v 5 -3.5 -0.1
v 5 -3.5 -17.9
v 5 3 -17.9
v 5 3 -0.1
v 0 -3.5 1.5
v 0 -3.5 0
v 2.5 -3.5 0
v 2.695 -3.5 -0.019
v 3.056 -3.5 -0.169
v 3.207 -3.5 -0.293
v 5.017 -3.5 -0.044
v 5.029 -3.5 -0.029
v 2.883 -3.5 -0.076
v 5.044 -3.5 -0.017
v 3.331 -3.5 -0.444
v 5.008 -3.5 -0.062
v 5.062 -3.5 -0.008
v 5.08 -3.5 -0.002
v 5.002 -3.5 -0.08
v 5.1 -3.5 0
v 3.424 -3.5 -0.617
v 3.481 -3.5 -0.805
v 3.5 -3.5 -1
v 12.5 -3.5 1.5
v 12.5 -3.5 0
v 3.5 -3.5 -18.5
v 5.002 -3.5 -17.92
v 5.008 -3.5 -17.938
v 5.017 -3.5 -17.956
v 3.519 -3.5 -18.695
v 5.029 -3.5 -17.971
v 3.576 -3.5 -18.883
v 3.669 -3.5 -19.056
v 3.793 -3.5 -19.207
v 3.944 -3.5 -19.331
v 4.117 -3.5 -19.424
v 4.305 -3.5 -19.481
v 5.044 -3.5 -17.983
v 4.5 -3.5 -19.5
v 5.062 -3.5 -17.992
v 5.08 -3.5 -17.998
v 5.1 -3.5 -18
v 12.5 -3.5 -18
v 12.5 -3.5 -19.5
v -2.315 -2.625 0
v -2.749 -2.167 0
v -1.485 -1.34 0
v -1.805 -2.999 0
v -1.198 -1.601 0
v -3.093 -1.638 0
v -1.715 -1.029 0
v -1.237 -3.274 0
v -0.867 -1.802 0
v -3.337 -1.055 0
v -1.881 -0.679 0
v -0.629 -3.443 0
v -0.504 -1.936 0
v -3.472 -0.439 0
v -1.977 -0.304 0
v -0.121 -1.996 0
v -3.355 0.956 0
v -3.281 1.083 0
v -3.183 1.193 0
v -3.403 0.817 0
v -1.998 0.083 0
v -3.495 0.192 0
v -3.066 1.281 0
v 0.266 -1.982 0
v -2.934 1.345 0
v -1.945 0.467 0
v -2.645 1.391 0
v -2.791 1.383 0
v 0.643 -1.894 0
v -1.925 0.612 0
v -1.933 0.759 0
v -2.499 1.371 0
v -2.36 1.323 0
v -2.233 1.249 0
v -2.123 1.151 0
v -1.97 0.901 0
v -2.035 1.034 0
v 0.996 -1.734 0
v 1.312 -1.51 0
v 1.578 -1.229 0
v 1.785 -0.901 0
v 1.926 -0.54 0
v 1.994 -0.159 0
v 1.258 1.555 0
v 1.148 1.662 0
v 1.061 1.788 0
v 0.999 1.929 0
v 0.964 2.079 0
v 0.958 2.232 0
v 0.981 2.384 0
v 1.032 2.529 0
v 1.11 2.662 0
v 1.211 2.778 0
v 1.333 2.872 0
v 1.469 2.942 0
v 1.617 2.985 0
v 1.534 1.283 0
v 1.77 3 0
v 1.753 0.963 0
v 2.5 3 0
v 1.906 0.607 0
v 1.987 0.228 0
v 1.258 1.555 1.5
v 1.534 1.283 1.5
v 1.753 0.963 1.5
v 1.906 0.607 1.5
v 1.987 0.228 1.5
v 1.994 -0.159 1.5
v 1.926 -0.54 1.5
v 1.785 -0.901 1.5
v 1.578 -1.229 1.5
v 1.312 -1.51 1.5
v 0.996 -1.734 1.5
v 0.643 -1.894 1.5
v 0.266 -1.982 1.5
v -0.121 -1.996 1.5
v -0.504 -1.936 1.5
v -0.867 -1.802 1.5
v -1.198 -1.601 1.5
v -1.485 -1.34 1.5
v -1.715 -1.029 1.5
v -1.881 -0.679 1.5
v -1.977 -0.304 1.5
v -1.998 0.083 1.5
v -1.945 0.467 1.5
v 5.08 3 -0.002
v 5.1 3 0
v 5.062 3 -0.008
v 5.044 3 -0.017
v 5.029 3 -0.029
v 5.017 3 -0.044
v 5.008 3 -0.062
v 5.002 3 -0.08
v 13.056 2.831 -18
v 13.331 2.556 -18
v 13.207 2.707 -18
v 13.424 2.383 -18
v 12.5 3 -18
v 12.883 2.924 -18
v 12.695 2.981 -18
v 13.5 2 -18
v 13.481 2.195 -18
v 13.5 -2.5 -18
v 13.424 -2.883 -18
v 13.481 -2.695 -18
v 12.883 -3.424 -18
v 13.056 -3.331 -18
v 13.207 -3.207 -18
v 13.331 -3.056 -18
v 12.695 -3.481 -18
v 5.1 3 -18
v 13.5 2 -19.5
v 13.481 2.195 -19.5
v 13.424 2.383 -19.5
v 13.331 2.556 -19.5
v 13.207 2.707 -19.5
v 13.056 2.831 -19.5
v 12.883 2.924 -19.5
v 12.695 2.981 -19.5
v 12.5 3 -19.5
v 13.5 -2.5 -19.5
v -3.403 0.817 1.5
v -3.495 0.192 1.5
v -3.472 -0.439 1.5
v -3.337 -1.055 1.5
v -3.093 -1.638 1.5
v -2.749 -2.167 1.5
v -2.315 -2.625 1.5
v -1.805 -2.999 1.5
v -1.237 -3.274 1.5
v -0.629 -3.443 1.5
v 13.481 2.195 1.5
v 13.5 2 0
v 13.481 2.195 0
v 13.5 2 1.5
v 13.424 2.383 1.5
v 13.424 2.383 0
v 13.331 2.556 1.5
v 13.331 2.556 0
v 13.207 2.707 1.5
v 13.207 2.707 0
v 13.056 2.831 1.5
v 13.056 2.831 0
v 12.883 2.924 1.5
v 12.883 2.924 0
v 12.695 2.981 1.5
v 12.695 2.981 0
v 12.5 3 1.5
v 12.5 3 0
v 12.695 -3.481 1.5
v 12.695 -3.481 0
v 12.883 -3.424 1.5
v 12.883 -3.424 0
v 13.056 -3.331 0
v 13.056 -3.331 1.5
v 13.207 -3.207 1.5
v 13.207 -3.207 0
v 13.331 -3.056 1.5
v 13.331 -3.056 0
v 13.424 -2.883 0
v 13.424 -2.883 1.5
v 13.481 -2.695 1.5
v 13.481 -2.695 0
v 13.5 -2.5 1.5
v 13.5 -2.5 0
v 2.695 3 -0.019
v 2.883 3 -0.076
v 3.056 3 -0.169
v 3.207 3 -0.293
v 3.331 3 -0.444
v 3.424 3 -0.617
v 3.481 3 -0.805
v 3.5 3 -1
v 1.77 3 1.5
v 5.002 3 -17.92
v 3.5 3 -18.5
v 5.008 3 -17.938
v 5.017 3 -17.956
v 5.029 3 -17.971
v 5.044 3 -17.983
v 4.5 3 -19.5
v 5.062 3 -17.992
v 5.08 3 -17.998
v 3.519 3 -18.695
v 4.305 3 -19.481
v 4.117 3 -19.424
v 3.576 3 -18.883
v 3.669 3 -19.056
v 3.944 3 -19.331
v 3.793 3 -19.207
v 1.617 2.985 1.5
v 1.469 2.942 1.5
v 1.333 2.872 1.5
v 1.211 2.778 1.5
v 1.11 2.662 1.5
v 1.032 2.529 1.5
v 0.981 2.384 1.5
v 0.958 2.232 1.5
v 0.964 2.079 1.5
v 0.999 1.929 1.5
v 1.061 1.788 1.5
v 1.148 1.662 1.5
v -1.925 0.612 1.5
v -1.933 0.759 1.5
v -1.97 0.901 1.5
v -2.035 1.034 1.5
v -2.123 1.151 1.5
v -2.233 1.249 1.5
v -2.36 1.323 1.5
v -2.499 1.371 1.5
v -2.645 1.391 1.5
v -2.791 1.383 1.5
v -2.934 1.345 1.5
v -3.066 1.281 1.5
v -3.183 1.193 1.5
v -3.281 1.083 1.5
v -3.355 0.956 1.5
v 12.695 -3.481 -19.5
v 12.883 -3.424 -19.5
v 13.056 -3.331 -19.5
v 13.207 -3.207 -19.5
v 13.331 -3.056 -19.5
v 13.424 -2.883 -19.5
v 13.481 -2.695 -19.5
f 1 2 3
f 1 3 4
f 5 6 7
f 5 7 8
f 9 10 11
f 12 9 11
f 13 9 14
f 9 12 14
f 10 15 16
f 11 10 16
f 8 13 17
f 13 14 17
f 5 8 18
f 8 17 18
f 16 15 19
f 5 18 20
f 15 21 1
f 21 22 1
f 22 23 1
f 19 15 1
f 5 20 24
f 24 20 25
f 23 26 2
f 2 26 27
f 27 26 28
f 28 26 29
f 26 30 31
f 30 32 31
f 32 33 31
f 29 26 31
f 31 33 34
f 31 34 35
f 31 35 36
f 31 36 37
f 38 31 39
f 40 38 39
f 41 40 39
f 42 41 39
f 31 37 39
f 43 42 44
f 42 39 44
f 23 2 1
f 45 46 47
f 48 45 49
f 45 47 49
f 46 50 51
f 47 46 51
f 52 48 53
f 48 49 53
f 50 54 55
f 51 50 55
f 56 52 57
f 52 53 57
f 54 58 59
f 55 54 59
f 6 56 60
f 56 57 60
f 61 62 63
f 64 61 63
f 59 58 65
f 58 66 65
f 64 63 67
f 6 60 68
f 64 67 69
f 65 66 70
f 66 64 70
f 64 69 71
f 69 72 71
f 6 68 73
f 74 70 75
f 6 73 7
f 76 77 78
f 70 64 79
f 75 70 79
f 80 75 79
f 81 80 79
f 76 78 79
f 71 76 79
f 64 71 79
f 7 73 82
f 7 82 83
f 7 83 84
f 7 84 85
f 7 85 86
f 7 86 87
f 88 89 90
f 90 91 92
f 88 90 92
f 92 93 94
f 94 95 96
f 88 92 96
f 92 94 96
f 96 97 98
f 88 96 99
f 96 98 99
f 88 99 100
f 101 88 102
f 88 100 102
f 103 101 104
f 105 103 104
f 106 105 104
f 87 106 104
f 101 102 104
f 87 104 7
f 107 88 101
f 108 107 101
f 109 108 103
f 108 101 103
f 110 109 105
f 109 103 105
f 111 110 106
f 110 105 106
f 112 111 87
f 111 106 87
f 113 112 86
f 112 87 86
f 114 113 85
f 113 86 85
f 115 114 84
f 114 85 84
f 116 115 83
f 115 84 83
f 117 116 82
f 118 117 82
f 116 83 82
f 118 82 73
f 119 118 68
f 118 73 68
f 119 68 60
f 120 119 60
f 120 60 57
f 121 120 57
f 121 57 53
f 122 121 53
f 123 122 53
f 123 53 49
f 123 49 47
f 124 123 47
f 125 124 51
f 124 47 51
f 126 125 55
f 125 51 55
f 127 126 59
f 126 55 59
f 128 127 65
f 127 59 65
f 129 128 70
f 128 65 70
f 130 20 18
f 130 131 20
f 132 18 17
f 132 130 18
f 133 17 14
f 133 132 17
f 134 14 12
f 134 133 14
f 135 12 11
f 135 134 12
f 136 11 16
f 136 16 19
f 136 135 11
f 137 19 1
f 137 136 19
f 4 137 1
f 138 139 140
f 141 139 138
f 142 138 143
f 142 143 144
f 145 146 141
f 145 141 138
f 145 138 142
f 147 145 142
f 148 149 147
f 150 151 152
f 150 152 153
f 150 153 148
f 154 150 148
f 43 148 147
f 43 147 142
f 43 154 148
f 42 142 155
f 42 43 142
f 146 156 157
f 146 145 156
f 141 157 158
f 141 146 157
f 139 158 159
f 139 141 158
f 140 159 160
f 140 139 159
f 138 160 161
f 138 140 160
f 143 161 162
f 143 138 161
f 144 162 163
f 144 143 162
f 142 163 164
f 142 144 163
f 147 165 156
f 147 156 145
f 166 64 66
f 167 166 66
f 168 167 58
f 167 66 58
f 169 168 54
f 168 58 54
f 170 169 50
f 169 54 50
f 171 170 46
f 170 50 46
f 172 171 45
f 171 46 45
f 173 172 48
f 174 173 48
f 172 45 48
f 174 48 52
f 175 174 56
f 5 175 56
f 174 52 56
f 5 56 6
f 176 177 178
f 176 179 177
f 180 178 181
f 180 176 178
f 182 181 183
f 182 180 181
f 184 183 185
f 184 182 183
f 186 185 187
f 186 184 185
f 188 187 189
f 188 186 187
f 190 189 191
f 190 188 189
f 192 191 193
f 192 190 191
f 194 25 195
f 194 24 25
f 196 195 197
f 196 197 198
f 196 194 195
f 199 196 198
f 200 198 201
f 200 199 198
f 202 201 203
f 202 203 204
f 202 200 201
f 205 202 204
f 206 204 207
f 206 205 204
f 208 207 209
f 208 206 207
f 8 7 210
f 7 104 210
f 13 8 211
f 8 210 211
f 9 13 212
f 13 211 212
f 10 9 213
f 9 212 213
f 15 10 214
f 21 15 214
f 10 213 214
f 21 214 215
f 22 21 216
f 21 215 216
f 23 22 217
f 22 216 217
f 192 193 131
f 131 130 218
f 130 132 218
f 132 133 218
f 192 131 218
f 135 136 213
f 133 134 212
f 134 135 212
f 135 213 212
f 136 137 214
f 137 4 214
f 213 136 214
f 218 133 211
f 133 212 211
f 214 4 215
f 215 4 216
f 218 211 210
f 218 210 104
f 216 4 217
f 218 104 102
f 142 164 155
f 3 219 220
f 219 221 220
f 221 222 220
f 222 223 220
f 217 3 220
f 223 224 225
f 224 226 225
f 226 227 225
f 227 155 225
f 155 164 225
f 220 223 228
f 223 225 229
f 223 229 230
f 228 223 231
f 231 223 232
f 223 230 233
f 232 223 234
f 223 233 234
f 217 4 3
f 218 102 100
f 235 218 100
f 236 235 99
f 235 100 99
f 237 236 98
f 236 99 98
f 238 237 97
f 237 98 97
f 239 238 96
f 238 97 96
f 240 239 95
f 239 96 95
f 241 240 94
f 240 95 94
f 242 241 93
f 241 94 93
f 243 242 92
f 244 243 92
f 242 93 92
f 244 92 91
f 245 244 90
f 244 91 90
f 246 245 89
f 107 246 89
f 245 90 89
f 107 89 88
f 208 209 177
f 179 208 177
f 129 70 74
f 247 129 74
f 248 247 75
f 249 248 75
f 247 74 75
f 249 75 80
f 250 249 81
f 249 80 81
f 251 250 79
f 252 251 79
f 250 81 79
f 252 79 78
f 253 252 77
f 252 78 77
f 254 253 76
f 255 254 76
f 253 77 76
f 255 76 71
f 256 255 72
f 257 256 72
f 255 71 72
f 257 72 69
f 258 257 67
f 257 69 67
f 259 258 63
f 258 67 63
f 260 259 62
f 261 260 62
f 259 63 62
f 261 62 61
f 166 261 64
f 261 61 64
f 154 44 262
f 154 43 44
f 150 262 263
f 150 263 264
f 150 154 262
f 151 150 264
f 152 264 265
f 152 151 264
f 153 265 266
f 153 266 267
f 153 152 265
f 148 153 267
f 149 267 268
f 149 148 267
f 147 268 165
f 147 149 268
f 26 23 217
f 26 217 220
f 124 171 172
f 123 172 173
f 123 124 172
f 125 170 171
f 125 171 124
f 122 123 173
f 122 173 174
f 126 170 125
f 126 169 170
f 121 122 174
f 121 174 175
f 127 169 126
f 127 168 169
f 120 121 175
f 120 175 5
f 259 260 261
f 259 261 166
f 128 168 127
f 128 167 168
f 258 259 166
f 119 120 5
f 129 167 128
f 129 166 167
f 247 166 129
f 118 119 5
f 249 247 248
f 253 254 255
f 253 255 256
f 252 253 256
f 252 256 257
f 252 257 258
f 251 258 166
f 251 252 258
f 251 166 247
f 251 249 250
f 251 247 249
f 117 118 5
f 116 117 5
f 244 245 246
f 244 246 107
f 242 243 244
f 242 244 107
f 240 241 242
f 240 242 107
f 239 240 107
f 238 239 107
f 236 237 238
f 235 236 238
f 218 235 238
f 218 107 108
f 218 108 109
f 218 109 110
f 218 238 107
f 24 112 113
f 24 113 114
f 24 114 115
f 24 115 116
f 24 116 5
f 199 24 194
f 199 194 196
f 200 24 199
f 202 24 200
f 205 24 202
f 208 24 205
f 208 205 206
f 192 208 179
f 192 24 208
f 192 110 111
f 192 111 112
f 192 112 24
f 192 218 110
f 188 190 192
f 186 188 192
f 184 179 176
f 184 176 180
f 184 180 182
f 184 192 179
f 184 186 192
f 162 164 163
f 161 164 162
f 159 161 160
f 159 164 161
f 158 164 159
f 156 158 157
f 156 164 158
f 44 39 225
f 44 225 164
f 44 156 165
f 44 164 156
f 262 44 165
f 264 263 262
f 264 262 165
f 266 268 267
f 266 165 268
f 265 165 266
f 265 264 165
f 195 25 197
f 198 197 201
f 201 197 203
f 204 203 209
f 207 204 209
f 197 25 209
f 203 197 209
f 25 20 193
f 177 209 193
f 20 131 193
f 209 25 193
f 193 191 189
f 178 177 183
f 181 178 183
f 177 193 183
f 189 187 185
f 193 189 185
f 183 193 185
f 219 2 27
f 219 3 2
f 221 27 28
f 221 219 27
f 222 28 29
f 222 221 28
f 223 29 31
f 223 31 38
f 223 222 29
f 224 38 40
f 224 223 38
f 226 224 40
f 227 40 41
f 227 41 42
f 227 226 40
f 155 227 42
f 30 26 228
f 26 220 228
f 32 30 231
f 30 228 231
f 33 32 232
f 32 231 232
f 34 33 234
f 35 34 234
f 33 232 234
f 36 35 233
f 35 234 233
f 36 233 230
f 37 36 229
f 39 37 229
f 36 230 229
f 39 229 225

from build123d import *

# Parameters (mm, degrees)
F1_DEPTH = 1.5
F3_DEPTH = 6.5
F4_R     = 0.1
F5_R     = 1
F6_R     = 1


# Not quite as in the source:
# - a feature of the source that left no trace in its solid (it failed there, or was rolled back) is left out


with BuildPart() as f1:
    # F0 (on Top) → F1 (new body)
    with BuildSketch(Plane.XY):
        with BuildLine():
            Line((13.5, -3.5), (13.5, 3))
            Line((13.5, 3), (1.7699947357, 3))
            ThreePointArc((1.7699947357, 3), (1.00332674, 2.4581115268), (1.2583103115, 1.5545594745))
            ThreePointArc((1.2583103115, 1.5545594745), (0.6431264076, -1.8937762339), (-1.9447626006, 0.466795916))
            ThreePointArc((-1.9447626006, 0.466795916), (-2.4990001073, 1.3711303598), (-3.4033345511, 0.8168928531))
            ThreePointArc((-3.4033345511, 0.8168928531), (-2.748556438, -2.1668958229), (0, -3.5))
            Line((0, -3.5), (1.7699947357, -3.5))
            Line((1.7699947357, -3.5), (13.5, -3.5))
        make_face()
    extrude(amount=F1_DEPTH)

    # F2 (on face) → F3 (join, through all)
    with BuildSketch(Plane.XZ.offset(3.5)):
        Polygon((5, 0), (3.5, 0), (3.5, -19.5), (13.5, -19.5), (13.5, -18), (5, -18), align=None)
    extrude(amount=-F3_DEPTH)

    # F4
    f4_edges = [f1.edges().sort_by_distance(p)[0] for p in [
        (5, -0.25, 0),
        (5, -0.25, -18),
    ]]
    fillet(f4_edges, radius=F4_R)

    # F5
    f5_edges = [f1.edges().sort_by_distance(p)[0] for p in [
        (3.5, -0.25, 0),
        (3.5, -0.25, -19.5),
    ]]
    fillet(f5_edges, radius=F5_R)

    # F6
    f6_edges = [f1.edges().sort_by_distance(p)[0] for p in [
        (13.5, -3.5, -18.75),
        (13.5, 3, -18.75),
        (13.5, -3.5, 0.75),
        (13.5, 3, 0.75),
    ]]
    fillet(f6_edges, radius=F6_R)


solid = f1.part
